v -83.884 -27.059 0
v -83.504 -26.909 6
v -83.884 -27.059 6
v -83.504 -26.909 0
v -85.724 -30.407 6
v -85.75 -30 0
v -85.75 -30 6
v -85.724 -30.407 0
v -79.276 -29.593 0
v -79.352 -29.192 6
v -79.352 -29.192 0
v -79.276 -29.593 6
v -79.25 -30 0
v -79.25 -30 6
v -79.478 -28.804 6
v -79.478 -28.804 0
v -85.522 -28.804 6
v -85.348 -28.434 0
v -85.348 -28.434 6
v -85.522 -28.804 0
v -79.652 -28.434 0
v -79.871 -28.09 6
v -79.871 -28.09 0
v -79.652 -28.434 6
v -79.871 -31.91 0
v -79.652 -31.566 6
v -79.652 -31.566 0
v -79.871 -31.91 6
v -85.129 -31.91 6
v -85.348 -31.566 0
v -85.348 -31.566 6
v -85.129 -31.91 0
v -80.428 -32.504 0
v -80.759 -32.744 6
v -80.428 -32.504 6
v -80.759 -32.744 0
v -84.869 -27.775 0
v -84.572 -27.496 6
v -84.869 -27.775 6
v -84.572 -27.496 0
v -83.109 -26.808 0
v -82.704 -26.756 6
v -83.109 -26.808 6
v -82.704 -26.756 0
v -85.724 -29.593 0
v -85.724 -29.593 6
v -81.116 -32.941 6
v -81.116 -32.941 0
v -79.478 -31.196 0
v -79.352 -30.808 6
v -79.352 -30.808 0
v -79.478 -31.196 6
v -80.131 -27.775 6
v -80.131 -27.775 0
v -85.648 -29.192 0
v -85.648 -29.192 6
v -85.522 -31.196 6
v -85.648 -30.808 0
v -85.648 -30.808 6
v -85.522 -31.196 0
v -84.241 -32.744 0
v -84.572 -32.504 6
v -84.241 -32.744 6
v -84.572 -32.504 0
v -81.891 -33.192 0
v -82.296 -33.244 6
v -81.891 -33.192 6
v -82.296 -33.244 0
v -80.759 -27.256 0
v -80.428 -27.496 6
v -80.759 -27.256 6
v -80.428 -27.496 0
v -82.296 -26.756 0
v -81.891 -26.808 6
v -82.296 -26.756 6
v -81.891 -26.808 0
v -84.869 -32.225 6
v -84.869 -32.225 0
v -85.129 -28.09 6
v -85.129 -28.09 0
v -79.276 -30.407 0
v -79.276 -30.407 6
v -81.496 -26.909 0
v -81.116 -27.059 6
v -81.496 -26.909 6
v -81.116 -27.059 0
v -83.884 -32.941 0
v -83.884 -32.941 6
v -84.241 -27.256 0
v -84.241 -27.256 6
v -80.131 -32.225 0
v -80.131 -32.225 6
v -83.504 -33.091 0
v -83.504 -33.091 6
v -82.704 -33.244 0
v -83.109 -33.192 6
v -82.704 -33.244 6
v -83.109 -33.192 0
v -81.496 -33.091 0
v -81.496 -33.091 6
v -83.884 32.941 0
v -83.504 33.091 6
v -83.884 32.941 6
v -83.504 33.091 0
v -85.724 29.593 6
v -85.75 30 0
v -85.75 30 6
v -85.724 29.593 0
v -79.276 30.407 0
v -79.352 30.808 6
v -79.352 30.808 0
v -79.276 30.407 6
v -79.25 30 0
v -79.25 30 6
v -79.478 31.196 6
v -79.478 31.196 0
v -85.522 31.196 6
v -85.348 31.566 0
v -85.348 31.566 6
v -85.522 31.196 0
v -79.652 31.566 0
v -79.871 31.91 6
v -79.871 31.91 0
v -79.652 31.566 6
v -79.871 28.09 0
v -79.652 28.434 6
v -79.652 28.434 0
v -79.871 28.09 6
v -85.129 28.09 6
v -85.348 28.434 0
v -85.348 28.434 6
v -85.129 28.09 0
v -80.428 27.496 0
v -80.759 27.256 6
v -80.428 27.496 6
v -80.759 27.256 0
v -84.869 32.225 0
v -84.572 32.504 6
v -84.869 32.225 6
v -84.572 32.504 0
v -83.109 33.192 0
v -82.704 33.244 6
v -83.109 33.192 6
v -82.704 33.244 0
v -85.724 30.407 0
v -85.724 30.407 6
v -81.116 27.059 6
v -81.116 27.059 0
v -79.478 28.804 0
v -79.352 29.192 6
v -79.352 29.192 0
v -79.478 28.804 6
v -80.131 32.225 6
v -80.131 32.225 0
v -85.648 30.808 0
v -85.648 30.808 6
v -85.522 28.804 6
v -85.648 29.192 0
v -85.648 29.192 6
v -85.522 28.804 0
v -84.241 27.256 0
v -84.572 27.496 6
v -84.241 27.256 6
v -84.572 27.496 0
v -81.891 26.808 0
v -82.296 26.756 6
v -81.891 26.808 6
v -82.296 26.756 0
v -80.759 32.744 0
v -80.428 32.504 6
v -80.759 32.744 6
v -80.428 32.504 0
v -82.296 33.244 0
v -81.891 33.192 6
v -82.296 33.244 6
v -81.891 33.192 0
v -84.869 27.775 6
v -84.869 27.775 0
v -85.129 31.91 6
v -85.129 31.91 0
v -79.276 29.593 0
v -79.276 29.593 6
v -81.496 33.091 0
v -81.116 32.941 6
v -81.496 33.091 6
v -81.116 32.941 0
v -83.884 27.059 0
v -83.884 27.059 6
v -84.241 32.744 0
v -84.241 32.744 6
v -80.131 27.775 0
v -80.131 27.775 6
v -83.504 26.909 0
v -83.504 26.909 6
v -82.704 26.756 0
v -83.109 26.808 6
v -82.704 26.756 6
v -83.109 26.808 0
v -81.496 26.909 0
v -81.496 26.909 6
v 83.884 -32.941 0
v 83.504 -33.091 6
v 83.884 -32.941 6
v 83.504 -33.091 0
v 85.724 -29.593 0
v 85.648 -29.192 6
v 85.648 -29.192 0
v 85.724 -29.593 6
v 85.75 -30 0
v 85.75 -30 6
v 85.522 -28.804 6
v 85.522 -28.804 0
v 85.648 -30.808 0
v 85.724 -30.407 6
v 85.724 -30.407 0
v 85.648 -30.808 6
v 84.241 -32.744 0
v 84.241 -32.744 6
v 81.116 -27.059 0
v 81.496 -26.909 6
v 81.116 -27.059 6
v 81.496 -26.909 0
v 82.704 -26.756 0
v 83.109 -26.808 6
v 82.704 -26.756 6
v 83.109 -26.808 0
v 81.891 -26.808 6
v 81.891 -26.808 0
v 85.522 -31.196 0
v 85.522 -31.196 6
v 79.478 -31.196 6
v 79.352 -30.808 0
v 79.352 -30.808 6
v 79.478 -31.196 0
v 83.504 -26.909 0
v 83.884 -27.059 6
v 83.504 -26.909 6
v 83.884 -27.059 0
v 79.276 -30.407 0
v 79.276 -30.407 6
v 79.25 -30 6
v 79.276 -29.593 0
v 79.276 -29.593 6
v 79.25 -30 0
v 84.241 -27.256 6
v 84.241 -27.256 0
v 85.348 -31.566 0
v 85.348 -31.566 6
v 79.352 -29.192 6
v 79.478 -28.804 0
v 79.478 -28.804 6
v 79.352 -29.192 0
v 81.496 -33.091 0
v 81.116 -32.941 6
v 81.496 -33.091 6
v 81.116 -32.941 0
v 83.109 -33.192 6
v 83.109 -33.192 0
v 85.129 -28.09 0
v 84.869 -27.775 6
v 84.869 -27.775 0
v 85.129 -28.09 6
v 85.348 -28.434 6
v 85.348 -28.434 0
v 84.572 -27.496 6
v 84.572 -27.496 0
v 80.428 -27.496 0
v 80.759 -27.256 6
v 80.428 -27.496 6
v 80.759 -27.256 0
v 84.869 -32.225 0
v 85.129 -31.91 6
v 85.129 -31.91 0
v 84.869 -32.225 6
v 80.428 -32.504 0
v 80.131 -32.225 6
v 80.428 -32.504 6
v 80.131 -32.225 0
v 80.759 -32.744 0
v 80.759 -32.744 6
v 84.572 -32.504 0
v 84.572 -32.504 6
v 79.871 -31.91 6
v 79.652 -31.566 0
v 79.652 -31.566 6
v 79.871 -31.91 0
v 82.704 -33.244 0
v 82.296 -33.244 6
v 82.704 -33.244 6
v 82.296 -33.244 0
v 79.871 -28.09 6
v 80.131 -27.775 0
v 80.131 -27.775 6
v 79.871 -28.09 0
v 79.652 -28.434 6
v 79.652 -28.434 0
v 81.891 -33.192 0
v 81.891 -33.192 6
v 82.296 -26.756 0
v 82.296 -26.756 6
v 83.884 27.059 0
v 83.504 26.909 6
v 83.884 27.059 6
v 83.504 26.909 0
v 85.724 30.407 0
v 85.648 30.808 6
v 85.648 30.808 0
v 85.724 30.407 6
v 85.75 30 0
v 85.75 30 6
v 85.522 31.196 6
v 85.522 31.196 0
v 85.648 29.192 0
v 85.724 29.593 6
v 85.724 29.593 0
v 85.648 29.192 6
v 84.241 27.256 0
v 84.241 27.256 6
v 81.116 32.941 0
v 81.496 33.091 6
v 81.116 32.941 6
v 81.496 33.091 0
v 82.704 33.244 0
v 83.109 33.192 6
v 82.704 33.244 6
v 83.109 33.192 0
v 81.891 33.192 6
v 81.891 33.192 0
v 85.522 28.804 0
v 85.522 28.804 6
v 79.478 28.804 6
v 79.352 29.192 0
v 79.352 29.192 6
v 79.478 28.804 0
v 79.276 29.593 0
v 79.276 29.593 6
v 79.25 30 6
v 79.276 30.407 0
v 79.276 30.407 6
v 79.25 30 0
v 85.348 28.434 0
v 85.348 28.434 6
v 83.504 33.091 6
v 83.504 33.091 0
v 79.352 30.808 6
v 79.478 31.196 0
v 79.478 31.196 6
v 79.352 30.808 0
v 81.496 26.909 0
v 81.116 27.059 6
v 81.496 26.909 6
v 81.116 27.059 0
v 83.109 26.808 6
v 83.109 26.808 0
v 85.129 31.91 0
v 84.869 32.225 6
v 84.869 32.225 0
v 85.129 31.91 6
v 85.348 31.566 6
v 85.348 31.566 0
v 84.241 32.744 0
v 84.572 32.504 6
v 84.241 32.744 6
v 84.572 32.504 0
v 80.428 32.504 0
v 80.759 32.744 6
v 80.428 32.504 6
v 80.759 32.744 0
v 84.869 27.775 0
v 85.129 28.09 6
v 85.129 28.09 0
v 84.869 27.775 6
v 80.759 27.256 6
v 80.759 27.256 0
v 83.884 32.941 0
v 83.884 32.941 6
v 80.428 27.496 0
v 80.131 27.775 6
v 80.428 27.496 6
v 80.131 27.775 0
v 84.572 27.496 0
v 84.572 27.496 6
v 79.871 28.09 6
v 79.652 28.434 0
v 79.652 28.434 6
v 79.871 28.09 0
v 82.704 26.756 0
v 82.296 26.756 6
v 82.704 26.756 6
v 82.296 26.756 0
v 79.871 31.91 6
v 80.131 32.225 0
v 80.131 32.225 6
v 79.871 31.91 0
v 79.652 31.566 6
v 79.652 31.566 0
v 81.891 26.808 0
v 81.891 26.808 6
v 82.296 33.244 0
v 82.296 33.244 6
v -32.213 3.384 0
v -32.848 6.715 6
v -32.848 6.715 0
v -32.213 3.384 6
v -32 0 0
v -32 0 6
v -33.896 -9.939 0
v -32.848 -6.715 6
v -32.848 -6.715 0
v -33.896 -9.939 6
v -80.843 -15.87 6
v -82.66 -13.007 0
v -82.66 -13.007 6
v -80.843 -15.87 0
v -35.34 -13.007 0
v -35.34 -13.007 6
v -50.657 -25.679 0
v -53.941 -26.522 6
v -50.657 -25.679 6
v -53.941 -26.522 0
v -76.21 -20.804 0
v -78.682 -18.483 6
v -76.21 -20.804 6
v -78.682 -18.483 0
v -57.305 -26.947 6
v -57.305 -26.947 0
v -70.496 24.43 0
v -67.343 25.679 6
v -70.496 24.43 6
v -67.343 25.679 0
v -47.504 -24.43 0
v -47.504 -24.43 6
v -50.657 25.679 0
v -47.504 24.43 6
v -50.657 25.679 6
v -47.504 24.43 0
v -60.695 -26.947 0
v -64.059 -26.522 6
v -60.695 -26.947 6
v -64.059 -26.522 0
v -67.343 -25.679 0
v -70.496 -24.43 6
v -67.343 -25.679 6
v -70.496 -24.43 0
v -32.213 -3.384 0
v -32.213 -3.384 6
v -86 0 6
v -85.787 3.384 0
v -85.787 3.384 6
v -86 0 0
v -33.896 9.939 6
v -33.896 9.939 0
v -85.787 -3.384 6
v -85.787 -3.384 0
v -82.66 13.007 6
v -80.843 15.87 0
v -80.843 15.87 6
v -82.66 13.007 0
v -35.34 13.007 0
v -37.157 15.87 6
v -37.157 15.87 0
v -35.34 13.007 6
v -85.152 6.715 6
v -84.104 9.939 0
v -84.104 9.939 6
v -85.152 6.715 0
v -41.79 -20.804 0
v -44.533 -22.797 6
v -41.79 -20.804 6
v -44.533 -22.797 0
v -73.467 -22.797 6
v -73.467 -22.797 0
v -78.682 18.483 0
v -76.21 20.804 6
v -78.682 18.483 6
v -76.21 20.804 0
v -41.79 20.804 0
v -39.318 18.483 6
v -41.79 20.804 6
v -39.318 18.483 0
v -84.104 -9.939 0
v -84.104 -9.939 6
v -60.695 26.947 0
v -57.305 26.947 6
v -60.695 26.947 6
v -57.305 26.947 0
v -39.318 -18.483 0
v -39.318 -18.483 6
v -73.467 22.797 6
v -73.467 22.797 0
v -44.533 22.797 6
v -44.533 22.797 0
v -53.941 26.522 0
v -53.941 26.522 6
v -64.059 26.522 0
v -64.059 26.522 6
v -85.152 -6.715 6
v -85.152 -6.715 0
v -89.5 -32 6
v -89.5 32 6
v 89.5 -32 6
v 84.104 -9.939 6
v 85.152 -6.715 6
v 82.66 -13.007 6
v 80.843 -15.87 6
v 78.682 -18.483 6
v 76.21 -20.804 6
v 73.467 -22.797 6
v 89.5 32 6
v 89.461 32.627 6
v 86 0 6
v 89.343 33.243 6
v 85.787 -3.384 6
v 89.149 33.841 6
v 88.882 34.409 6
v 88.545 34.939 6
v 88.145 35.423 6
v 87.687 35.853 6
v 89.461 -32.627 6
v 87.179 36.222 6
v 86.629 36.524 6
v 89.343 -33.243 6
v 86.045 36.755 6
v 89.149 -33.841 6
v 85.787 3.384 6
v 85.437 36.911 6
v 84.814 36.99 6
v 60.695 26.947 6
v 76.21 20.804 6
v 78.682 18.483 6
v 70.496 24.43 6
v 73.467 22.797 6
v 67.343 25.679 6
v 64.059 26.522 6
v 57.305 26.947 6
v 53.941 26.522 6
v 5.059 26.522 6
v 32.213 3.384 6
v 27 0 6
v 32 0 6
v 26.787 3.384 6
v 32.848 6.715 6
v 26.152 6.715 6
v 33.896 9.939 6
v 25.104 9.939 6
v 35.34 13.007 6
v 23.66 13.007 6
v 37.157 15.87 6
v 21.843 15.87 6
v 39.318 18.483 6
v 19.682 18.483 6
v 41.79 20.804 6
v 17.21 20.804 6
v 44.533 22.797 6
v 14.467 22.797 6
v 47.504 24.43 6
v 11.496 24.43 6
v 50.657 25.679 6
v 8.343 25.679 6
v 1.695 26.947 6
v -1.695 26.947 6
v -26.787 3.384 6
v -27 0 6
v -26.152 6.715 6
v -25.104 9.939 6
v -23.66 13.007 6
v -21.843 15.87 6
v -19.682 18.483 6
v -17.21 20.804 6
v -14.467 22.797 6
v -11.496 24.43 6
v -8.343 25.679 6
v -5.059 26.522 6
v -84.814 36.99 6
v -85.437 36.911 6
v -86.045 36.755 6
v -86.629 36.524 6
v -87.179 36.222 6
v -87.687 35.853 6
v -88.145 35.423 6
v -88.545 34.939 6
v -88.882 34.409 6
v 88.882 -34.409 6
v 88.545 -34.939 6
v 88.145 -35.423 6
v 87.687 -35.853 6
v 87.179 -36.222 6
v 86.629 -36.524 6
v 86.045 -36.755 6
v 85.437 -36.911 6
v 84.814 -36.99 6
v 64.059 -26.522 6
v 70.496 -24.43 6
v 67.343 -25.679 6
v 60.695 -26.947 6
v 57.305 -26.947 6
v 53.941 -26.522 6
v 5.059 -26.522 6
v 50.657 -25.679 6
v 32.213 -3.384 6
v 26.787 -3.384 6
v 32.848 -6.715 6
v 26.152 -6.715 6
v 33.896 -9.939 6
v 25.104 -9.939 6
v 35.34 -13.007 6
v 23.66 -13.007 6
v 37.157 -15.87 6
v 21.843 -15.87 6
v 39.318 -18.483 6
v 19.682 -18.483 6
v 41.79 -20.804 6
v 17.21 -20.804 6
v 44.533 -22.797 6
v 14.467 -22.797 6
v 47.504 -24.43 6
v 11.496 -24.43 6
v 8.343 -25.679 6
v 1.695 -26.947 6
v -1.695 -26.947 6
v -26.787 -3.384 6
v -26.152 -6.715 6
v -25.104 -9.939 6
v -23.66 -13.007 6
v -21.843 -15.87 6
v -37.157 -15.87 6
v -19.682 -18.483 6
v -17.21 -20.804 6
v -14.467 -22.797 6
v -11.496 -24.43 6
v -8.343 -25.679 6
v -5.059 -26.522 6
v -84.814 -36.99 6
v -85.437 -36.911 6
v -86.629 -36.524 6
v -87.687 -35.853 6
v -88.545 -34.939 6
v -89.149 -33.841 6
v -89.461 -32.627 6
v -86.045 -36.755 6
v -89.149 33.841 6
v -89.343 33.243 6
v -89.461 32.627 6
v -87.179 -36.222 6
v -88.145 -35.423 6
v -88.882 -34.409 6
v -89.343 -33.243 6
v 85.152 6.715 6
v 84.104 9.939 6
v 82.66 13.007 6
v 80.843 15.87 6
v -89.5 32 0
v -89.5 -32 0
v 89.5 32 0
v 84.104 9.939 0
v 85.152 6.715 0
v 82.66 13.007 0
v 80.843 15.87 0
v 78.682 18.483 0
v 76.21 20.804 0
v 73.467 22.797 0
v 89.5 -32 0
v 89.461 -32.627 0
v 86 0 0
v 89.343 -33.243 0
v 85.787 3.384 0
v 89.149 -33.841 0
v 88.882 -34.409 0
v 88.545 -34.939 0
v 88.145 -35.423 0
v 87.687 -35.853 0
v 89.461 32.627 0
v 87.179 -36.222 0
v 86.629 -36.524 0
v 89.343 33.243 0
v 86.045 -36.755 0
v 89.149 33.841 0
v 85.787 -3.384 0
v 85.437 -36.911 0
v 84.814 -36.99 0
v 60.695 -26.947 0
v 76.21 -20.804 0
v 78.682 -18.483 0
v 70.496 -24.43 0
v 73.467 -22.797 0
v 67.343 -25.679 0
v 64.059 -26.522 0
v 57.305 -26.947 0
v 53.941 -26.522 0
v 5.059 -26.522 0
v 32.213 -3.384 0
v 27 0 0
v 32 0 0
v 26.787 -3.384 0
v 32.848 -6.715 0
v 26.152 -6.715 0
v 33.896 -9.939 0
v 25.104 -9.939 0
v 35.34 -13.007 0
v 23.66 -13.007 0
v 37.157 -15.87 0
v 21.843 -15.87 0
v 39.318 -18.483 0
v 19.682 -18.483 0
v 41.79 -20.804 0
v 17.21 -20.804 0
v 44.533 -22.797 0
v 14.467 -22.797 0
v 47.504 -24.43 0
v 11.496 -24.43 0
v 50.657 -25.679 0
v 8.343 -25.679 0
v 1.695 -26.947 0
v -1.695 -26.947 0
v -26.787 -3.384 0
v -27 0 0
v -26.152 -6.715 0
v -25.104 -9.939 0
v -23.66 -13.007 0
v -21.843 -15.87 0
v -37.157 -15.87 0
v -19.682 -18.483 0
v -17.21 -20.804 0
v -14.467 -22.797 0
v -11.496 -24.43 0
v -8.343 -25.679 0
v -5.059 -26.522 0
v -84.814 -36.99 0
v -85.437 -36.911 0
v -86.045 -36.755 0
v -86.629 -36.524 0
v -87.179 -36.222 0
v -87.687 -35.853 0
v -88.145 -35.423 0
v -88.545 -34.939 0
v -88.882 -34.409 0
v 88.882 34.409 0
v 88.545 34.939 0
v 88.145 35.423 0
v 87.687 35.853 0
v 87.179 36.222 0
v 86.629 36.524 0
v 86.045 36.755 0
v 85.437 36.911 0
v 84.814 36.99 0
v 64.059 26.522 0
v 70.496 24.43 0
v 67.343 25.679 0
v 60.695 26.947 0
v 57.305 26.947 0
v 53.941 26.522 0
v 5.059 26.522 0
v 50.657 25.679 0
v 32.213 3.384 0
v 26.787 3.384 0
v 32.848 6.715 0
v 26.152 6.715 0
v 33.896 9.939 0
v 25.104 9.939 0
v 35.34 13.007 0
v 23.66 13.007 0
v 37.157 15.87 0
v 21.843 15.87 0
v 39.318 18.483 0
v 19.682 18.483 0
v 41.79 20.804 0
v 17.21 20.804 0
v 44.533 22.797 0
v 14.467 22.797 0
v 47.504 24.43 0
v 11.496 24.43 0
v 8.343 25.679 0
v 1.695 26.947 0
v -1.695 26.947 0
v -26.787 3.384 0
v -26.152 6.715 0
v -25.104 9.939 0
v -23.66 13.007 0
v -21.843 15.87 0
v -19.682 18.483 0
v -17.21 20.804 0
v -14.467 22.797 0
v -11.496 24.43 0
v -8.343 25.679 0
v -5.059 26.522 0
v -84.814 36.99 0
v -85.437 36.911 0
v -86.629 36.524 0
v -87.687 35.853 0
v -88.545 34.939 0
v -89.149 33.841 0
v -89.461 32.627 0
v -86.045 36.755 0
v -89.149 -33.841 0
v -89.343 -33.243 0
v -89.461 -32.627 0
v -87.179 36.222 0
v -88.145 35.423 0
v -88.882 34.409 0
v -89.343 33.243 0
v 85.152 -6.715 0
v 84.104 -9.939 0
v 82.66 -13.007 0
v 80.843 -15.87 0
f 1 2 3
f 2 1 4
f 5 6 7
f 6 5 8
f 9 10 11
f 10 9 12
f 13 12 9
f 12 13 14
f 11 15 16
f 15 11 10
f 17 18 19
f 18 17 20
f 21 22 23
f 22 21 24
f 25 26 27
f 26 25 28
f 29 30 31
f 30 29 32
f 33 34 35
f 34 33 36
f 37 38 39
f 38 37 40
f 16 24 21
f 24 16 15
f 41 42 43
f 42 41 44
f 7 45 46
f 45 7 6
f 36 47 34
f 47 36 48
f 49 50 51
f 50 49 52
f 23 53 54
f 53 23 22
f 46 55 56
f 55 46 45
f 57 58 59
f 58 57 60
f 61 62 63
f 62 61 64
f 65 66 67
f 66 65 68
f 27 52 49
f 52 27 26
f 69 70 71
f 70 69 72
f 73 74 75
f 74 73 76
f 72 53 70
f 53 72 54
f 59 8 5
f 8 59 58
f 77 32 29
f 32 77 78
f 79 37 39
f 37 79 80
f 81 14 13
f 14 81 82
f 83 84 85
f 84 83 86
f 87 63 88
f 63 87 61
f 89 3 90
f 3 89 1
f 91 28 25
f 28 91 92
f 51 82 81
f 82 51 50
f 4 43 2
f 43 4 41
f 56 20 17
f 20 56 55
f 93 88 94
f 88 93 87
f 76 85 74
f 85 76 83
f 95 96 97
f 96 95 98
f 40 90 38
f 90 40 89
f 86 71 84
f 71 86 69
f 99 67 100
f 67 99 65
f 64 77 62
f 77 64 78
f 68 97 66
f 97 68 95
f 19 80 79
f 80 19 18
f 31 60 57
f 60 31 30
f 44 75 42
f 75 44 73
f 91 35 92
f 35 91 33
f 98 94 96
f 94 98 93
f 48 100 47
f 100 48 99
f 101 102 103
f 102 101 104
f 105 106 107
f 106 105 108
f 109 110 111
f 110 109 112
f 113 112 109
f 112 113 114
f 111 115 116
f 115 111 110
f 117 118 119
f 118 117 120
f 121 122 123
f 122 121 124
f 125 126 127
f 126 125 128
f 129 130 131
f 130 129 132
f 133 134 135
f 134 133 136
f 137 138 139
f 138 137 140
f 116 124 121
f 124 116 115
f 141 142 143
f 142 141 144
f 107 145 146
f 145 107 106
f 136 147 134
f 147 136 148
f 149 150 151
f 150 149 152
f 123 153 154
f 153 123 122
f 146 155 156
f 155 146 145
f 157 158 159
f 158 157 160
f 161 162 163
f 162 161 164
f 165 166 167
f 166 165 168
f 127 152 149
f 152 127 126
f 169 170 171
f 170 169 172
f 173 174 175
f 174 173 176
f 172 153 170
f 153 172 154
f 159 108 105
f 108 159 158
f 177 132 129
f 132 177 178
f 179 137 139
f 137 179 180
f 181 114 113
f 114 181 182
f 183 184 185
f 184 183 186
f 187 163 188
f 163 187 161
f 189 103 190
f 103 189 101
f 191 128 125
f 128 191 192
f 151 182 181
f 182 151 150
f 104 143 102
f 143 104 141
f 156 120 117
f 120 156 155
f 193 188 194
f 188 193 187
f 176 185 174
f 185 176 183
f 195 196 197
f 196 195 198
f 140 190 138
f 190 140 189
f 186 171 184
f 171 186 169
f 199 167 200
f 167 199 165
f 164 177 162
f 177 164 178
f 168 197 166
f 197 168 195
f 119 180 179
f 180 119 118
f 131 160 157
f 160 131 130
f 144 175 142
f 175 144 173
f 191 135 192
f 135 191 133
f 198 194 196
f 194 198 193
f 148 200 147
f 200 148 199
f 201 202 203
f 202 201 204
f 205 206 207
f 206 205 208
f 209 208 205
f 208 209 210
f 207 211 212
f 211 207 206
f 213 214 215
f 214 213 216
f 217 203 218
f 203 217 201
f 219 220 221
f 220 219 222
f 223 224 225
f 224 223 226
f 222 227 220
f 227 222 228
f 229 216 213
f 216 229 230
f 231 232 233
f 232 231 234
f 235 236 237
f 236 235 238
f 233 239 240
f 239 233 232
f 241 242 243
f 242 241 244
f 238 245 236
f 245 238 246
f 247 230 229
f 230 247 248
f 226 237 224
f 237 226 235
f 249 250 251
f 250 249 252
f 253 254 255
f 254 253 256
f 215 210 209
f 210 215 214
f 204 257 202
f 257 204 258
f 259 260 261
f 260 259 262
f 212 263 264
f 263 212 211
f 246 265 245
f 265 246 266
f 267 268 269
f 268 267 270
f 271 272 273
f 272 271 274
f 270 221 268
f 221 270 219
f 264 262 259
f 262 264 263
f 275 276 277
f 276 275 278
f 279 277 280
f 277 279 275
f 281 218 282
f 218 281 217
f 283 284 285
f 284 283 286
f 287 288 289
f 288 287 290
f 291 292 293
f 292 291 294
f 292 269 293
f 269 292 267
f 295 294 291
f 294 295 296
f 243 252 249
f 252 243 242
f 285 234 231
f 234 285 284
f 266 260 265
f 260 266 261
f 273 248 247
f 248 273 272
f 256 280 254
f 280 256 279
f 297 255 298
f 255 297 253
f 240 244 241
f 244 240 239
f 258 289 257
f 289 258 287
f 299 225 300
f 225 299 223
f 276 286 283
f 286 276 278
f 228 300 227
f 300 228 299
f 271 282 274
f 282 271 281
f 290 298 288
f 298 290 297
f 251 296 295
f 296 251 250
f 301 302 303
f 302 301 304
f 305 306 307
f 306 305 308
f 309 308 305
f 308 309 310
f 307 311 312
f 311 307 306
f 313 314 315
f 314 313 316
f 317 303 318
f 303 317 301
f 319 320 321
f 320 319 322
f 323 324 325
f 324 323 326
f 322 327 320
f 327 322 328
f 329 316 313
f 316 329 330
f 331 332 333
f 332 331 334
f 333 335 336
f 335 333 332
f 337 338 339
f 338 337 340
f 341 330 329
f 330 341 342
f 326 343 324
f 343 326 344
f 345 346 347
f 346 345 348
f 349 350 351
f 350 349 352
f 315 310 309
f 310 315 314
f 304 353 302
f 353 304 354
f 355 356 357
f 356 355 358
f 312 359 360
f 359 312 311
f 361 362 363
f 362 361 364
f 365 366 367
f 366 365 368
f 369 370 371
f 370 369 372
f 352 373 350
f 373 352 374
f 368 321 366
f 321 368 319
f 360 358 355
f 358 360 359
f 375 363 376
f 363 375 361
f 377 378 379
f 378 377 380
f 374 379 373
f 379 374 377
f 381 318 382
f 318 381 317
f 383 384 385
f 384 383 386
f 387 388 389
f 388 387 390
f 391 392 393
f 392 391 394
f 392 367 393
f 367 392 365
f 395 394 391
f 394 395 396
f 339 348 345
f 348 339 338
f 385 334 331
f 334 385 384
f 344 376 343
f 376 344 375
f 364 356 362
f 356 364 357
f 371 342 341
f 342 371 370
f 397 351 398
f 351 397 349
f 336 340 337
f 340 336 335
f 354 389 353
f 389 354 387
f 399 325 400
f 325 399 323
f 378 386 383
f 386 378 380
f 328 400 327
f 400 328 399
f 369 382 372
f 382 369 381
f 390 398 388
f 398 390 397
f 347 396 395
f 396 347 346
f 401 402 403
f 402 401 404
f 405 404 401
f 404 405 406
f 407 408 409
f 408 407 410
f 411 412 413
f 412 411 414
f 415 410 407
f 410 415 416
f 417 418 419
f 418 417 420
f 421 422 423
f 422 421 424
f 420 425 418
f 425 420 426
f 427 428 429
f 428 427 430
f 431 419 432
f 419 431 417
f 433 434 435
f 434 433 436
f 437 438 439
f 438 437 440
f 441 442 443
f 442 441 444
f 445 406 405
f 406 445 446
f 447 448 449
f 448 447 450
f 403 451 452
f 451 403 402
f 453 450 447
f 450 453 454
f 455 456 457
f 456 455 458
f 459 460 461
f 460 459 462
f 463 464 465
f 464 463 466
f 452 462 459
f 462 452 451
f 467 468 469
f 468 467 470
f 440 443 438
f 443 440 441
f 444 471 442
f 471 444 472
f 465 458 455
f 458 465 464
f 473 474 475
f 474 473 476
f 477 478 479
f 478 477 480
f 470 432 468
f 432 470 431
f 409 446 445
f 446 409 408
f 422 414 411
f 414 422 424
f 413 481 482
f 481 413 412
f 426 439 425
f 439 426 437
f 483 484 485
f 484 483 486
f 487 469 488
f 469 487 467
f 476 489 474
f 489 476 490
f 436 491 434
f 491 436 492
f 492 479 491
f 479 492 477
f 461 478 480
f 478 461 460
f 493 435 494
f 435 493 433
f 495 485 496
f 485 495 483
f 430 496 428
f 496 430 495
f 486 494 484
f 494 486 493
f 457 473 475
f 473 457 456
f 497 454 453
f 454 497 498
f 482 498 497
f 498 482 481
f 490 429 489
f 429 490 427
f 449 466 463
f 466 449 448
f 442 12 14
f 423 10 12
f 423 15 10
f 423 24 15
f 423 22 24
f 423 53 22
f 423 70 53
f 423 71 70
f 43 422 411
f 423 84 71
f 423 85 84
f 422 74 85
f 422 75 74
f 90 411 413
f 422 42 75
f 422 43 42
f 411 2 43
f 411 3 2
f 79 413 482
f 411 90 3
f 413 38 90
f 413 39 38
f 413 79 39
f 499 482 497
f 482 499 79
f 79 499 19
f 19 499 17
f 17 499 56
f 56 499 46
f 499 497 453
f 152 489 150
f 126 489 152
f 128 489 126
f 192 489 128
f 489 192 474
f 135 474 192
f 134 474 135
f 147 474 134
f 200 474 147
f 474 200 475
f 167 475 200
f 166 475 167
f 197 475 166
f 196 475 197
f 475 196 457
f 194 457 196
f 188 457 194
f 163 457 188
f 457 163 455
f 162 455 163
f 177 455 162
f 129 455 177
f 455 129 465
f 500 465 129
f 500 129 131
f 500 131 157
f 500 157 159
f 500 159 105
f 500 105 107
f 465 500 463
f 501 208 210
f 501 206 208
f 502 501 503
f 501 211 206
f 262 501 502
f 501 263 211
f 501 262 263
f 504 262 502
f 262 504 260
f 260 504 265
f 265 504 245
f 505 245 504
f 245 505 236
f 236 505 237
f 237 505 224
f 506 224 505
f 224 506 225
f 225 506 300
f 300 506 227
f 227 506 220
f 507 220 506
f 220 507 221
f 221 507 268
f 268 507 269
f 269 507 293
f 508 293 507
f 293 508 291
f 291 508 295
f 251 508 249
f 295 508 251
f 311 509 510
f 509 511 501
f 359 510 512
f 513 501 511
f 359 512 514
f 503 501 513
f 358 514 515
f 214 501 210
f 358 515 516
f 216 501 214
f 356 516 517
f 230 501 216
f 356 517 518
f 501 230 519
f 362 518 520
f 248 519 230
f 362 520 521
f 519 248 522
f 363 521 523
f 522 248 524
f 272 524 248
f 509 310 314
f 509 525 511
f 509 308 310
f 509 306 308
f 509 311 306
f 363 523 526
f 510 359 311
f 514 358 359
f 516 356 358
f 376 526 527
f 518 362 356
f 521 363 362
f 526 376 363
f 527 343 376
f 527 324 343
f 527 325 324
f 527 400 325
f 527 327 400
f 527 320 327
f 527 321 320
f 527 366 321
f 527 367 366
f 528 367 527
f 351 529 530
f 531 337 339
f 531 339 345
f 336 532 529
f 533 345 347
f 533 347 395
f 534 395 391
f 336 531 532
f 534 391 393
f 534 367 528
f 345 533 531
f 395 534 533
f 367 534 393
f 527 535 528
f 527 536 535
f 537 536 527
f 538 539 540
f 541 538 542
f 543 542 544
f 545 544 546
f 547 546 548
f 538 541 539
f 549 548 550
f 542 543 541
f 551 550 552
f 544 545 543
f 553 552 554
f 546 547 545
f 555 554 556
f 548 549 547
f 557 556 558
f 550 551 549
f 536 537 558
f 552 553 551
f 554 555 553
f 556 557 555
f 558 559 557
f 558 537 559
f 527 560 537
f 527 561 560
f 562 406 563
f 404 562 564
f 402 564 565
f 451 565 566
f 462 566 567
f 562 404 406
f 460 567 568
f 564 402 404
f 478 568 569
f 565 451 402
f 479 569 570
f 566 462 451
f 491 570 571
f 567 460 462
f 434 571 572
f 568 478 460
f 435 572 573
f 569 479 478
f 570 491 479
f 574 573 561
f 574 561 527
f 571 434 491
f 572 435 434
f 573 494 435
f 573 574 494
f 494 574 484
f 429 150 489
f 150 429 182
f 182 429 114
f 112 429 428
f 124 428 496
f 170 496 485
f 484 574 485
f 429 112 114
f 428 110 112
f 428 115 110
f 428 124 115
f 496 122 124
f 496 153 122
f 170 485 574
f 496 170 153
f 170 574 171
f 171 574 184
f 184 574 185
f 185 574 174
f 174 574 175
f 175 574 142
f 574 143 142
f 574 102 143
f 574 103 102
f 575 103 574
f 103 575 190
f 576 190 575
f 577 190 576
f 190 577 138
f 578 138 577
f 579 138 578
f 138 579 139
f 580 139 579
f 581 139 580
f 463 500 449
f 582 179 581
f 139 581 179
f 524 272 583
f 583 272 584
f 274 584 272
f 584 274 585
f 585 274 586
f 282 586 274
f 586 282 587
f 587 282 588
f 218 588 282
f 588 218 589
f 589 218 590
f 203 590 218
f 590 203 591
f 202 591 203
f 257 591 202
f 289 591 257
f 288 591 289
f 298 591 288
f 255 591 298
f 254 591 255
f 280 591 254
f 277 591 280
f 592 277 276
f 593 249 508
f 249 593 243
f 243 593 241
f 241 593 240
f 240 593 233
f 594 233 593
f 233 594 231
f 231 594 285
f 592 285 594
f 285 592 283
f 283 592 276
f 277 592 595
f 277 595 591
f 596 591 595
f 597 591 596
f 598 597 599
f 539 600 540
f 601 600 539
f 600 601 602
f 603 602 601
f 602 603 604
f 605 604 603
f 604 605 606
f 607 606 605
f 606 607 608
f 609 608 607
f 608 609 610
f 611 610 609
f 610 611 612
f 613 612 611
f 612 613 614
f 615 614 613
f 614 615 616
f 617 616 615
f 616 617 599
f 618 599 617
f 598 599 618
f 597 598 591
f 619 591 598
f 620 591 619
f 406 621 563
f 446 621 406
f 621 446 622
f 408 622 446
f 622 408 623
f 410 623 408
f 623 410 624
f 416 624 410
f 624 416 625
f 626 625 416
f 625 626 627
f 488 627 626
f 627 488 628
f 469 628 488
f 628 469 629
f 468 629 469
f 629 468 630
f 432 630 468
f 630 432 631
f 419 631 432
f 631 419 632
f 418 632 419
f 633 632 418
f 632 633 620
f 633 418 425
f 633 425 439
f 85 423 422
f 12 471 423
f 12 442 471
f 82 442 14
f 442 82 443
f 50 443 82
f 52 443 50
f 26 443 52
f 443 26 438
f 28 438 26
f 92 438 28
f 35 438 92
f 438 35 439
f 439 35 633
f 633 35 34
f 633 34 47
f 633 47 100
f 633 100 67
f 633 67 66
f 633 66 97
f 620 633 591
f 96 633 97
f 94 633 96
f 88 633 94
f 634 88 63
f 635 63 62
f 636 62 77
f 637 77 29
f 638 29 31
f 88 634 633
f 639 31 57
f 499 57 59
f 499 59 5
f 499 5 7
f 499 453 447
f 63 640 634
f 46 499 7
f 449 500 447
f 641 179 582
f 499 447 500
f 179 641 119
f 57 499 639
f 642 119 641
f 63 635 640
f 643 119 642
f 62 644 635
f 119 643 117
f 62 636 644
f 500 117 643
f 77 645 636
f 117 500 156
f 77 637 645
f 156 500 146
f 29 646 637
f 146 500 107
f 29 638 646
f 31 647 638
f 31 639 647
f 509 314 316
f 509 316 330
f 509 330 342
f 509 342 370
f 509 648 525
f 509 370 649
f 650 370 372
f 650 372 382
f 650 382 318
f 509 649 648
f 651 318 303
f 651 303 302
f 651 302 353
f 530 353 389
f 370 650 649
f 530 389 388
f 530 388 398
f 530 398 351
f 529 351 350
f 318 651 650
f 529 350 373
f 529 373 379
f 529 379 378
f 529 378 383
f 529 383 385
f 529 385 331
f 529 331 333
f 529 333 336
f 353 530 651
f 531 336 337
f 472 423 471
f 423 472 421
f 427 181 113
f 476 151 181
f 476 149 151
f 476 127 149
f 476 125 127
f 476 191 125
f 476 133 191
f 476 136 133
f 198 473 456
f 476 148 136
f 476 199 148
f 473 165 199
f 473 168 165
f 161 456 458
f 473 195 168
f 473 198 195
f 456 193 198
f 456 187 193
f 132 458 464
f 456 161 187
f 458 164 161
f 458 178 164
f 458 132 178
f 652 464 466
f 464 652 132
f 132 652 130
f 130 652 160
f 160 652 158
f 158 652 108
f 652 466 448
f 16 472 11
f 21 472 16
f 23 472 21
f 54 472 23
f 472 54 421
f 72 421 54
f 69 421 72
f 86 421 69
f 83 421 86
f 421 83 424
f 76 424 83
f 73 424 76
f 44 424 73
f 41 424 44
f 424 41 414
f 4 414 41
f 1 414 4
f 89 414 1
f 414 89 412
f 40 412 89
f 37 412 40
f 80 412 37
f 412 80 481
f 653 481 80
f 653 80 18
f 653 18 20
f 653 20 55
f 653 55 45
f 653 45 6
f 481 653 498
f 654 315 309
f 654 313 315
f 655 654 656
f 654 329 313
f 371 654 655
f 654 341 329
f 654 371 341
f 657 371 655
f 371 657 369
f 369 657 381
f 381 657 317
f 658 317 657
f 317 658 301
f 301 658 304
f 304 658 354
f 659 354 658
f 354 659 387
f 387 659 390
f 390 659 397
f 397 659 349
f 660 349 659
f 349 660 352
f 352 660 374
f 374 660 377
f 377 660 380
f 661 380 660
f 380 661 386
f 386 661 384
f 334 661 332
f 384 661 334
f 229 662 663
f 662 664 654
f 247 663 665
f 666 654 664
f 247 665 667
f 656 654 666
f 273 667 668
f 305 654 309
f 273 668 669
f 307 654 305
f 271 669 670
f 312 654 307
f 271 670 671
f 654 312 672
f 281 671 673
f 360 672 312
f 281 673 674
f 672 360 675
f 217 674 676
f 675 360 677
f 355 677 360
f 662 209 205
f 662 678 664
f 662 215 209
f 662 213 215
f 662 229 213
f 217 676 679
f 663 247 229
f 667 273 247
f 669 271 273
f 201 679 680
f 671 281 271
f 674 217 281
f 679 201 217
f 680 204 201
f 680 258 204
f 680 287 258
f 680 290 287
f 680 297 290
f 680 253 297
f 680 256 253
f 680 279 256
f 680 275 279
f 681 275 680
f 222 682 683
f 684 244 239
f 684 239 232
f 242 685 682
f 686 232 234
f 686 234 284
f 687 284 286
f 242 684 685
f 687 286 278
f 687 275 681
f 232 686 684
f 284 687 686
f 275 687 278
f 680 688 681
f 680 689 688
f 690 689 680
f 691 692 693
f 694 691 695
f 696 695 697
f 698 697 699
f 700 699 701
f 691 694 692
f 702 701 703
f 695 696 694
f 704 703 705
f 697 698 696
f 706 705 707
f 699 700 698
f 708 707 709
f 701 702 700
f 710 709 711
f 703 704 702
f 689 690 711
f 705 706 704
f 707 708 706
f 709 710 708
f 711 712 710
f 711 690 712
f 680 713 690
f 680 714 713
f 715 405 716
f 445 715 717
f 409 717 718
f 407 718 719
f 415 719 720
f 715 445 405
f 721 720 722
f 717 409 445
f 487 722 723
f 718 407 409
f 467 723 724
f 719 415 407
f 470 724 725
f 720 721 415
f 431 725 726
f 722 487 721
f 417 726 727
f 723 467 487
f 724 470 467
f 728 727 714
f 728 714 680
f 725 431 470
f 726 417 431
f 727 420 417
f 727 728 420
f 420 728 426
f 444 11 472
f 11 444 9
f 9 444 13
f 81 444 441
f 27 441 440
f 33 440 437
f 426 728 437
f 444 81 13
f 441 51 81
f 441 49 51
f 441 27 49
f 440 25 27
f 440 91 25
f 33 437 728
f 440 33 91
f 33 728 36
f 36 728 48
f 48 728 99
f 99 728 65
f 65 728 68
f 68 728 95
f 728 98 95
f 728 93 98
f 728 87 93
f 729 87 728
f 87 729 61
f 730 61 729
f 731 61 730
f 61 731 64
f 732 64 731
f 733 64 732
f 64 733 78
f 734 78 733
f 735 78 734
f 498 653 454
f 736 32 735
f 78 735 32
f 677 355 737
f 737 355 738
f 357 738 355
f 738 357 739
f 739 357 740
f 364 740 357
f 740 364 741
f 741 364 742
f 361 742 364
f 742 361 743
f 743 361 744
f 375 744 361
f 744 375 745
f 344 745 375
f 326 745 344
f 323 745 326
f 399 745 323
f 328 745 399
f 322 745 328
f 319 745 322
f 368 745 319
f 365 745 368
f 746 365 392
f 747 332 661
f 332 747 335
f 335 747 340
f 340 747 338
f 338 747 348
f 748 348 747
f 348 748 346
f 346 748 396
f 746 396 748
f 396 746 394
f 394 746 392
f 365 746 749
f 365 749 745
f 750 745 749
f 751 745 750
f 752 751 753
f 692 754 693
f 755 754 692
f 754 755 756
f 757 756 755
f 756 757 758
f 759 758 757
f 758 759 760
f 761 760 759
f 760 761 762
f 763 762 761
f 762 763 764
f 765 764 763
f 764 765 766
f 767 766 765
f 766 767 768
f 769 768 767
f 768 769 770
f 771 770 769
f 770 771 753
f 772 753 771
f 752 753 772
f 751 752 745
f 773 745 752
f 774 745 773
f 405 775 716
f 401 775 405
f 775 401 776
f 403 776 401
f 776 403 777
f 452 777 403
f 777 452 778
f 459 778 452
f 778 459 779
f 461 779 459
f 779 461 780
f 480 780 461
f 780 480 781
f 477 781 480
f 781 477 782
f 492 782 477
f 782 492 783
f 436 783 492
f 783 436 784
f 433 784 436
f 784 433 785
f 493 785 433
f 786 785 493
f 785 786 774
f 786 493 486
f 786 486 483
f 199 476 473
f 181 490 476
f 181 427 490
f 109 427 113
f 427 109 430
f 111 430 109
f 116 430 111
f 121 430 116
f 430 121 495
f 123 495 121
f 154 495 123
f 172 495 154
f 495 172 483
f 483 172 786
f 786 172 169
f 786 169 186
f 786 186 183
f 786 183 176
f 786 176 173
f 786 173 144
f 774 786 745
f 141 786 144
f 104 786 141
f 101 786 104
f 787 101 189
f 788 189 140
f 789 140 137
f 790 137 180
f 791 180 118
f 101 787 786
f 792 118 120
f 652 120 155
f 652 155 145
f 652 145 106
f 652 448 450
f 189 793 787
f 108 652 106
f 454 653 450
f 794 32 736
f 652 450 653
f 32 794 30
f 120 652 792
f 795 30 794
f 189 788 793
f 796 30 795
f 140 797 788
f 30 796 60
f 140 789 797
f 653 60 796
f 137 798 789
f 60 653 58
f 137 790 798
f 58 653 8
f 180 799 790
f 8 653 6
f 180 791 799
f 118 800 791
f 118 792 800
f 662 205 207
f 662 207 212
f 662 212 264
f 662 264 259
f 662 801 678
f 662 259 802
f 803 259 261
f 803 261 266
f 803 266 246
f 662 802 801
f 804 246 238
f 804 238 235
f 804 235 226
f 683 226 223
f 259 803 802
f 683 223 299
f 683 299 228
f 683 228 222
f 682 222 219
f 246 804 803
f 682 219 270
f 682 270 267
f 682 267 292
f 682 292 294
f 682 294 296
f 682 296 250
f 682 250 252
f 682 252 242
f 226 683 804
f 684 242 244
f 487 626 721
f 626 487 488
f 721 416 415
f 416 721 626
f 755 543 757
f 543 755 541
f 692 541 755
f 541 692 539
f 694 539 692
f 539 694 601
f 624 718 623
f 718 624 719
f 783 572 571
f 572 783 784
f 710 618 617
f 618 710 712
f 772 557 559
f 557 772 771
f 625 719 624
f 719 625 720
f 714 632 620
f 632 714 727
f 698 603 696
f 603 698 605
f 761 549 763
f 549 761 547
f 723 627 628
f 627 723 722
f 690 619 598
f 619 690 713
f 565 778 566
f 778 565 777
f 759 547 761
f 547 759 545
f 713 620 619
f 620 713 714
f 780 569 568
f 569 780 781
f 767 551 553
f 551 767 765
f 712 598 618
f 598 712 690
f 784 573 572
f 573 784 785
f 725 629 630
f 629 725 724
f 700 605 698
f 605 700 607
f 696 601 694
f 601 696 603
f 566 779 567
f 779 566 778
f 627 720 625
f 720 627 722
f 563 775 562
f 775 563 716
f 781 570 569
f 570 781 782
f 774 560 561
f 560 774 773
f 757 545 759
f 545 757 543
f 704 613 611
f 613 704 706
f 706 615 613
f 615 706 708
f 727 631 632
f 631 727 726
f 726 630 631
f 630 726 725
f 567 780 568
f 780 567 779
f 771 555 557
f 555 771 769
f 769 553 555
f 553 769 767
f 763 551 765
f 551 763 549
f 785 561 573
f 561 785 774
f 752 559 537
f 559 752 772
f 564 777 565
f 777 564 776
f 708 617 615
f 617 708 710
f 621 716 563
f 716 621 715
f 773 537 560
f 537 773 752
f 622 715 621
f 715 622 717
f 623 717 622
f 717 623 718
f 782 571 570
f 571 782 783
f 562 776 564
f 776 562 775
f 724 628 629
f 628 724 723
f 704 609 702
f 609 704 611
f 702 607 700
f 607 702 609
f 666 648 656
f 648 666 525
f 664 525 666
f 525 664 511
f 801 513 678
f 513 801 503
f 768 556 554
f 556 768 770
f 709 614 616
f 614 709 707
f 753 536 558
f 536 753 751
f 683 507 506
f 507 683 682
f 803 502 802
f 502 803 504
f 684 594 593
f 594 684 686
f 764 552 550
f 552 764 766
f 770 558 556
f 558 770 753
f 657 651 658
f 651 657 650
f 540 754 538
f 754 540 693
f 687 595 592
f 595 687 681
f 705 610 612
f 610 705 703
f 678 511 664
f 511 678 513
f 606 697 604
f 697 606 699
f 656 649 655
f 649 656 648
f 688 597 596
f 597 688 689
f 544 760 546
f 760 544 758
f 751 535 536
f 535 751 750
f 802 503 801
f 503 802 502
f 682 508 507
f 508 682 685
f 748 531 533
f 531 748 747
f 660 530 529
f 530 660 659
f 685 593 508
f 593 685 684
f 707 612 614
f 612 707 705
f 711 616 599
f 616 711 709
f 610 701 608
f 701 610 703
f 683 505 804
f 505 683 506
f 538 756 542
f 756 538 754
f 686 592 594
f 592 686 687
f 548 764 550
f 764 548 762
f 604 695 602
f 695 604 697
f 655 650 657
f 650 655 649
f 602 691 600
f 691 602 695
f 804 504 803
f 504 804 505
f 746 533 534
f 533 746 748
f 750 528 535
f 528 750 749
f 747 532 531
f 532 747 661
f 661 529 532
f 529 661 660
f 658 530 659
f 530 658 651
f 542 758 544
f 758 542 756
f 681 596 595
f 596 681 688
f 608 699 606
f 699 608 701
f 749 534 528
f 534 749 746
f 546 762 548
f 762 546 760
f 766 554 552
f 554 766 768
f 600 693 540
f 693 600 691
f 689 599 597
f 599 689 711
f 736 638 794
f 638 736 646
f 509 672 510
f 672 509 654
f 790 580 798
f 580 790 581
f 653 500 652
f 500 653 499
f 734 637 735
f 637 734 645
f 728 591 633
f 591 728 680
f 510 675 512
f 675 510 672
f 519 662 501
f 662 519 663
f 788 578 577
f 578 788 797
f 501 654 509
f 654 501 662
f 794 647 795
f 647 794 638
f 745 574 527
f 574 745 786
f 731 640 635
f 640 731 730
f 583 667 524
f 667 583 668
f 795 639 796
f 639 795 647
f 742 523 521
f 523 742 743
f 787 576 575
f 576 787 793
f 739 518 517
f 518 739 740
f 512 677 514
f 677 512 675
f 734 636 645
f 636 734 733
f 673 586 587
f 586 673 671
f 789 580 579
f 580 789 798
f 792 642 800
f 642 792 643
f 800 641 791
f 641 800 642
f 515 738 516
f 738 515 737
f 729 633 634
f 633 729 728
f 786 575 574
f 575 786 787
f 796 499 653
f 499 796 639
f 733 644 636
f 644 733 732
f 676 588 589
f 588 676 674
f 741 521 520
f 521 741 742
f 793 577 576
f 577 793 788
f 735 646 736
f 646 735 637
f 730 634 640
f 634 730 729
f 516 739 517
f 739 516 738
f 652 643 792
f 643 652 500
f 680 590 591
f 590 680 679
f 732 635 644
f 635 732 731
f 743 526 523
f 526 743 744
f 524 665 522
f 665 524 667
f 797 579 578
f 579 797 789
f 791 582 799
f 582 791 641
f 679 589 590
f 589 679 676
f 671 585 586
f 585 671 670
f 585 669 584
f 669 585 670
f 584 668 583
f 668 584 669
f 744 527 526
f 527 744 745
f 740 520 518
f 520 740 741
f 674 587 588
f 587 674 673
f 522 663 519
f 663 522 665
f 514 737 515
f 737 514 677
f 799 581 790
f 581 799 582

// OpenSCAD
$fn = 50;


difference() {
	union() {
		hull() {
			translate(v = [-84.5000000000, 32.0000000000, 0]) {
				cylinder(h = 6, r = 5);
			}
			translate(v = [84.5000000000, 32.0000000000, 0]) {
				cylinder(h = 6, r = 5);
			}
			translate(v = [-84.5000000000, -32.0000000000, 0]) {
				cylinder(h = 6, r = 5);
			}
			translate(v = [84.5000000000, -32.0000000000, 0]) {
				cylinder(h = 6, r = 5);
			}
		}
	}
	union() {
		#translate(v = [-82.5000000000, -30.0000000000, -100.0000000000]) {
			cylinder(h = 200, r = 3.2500000000);
		}
		#translate(v = [-82.5000000000, 30.0000000000, -100.0000000000]) {
			cylinder(h = 200, r = 3.2500000000);
		}
		#translate(v = [82.5000000000, -30.0000000000, -100.0000000000]) {
			cylinder(h = 200, r = 3.2500000000);
		}
		#translate(v = [82.5000000000, 30.0000000000, -100.0000000000]) {
			cylinder(h = 200, r = 3.2500000000);
		}
		#translate(v = [-59.0000000000, 0, 0]) {
			cylinder(h = 6, r = 27.0000000000);
		}
		#cylinder(h = 6, r = 27.0000000000);
		#translate(v = [59.0000000000, 0, 0]) {
			cylinder(h = 6, r = 27.0000000000);
		}
	}
}
